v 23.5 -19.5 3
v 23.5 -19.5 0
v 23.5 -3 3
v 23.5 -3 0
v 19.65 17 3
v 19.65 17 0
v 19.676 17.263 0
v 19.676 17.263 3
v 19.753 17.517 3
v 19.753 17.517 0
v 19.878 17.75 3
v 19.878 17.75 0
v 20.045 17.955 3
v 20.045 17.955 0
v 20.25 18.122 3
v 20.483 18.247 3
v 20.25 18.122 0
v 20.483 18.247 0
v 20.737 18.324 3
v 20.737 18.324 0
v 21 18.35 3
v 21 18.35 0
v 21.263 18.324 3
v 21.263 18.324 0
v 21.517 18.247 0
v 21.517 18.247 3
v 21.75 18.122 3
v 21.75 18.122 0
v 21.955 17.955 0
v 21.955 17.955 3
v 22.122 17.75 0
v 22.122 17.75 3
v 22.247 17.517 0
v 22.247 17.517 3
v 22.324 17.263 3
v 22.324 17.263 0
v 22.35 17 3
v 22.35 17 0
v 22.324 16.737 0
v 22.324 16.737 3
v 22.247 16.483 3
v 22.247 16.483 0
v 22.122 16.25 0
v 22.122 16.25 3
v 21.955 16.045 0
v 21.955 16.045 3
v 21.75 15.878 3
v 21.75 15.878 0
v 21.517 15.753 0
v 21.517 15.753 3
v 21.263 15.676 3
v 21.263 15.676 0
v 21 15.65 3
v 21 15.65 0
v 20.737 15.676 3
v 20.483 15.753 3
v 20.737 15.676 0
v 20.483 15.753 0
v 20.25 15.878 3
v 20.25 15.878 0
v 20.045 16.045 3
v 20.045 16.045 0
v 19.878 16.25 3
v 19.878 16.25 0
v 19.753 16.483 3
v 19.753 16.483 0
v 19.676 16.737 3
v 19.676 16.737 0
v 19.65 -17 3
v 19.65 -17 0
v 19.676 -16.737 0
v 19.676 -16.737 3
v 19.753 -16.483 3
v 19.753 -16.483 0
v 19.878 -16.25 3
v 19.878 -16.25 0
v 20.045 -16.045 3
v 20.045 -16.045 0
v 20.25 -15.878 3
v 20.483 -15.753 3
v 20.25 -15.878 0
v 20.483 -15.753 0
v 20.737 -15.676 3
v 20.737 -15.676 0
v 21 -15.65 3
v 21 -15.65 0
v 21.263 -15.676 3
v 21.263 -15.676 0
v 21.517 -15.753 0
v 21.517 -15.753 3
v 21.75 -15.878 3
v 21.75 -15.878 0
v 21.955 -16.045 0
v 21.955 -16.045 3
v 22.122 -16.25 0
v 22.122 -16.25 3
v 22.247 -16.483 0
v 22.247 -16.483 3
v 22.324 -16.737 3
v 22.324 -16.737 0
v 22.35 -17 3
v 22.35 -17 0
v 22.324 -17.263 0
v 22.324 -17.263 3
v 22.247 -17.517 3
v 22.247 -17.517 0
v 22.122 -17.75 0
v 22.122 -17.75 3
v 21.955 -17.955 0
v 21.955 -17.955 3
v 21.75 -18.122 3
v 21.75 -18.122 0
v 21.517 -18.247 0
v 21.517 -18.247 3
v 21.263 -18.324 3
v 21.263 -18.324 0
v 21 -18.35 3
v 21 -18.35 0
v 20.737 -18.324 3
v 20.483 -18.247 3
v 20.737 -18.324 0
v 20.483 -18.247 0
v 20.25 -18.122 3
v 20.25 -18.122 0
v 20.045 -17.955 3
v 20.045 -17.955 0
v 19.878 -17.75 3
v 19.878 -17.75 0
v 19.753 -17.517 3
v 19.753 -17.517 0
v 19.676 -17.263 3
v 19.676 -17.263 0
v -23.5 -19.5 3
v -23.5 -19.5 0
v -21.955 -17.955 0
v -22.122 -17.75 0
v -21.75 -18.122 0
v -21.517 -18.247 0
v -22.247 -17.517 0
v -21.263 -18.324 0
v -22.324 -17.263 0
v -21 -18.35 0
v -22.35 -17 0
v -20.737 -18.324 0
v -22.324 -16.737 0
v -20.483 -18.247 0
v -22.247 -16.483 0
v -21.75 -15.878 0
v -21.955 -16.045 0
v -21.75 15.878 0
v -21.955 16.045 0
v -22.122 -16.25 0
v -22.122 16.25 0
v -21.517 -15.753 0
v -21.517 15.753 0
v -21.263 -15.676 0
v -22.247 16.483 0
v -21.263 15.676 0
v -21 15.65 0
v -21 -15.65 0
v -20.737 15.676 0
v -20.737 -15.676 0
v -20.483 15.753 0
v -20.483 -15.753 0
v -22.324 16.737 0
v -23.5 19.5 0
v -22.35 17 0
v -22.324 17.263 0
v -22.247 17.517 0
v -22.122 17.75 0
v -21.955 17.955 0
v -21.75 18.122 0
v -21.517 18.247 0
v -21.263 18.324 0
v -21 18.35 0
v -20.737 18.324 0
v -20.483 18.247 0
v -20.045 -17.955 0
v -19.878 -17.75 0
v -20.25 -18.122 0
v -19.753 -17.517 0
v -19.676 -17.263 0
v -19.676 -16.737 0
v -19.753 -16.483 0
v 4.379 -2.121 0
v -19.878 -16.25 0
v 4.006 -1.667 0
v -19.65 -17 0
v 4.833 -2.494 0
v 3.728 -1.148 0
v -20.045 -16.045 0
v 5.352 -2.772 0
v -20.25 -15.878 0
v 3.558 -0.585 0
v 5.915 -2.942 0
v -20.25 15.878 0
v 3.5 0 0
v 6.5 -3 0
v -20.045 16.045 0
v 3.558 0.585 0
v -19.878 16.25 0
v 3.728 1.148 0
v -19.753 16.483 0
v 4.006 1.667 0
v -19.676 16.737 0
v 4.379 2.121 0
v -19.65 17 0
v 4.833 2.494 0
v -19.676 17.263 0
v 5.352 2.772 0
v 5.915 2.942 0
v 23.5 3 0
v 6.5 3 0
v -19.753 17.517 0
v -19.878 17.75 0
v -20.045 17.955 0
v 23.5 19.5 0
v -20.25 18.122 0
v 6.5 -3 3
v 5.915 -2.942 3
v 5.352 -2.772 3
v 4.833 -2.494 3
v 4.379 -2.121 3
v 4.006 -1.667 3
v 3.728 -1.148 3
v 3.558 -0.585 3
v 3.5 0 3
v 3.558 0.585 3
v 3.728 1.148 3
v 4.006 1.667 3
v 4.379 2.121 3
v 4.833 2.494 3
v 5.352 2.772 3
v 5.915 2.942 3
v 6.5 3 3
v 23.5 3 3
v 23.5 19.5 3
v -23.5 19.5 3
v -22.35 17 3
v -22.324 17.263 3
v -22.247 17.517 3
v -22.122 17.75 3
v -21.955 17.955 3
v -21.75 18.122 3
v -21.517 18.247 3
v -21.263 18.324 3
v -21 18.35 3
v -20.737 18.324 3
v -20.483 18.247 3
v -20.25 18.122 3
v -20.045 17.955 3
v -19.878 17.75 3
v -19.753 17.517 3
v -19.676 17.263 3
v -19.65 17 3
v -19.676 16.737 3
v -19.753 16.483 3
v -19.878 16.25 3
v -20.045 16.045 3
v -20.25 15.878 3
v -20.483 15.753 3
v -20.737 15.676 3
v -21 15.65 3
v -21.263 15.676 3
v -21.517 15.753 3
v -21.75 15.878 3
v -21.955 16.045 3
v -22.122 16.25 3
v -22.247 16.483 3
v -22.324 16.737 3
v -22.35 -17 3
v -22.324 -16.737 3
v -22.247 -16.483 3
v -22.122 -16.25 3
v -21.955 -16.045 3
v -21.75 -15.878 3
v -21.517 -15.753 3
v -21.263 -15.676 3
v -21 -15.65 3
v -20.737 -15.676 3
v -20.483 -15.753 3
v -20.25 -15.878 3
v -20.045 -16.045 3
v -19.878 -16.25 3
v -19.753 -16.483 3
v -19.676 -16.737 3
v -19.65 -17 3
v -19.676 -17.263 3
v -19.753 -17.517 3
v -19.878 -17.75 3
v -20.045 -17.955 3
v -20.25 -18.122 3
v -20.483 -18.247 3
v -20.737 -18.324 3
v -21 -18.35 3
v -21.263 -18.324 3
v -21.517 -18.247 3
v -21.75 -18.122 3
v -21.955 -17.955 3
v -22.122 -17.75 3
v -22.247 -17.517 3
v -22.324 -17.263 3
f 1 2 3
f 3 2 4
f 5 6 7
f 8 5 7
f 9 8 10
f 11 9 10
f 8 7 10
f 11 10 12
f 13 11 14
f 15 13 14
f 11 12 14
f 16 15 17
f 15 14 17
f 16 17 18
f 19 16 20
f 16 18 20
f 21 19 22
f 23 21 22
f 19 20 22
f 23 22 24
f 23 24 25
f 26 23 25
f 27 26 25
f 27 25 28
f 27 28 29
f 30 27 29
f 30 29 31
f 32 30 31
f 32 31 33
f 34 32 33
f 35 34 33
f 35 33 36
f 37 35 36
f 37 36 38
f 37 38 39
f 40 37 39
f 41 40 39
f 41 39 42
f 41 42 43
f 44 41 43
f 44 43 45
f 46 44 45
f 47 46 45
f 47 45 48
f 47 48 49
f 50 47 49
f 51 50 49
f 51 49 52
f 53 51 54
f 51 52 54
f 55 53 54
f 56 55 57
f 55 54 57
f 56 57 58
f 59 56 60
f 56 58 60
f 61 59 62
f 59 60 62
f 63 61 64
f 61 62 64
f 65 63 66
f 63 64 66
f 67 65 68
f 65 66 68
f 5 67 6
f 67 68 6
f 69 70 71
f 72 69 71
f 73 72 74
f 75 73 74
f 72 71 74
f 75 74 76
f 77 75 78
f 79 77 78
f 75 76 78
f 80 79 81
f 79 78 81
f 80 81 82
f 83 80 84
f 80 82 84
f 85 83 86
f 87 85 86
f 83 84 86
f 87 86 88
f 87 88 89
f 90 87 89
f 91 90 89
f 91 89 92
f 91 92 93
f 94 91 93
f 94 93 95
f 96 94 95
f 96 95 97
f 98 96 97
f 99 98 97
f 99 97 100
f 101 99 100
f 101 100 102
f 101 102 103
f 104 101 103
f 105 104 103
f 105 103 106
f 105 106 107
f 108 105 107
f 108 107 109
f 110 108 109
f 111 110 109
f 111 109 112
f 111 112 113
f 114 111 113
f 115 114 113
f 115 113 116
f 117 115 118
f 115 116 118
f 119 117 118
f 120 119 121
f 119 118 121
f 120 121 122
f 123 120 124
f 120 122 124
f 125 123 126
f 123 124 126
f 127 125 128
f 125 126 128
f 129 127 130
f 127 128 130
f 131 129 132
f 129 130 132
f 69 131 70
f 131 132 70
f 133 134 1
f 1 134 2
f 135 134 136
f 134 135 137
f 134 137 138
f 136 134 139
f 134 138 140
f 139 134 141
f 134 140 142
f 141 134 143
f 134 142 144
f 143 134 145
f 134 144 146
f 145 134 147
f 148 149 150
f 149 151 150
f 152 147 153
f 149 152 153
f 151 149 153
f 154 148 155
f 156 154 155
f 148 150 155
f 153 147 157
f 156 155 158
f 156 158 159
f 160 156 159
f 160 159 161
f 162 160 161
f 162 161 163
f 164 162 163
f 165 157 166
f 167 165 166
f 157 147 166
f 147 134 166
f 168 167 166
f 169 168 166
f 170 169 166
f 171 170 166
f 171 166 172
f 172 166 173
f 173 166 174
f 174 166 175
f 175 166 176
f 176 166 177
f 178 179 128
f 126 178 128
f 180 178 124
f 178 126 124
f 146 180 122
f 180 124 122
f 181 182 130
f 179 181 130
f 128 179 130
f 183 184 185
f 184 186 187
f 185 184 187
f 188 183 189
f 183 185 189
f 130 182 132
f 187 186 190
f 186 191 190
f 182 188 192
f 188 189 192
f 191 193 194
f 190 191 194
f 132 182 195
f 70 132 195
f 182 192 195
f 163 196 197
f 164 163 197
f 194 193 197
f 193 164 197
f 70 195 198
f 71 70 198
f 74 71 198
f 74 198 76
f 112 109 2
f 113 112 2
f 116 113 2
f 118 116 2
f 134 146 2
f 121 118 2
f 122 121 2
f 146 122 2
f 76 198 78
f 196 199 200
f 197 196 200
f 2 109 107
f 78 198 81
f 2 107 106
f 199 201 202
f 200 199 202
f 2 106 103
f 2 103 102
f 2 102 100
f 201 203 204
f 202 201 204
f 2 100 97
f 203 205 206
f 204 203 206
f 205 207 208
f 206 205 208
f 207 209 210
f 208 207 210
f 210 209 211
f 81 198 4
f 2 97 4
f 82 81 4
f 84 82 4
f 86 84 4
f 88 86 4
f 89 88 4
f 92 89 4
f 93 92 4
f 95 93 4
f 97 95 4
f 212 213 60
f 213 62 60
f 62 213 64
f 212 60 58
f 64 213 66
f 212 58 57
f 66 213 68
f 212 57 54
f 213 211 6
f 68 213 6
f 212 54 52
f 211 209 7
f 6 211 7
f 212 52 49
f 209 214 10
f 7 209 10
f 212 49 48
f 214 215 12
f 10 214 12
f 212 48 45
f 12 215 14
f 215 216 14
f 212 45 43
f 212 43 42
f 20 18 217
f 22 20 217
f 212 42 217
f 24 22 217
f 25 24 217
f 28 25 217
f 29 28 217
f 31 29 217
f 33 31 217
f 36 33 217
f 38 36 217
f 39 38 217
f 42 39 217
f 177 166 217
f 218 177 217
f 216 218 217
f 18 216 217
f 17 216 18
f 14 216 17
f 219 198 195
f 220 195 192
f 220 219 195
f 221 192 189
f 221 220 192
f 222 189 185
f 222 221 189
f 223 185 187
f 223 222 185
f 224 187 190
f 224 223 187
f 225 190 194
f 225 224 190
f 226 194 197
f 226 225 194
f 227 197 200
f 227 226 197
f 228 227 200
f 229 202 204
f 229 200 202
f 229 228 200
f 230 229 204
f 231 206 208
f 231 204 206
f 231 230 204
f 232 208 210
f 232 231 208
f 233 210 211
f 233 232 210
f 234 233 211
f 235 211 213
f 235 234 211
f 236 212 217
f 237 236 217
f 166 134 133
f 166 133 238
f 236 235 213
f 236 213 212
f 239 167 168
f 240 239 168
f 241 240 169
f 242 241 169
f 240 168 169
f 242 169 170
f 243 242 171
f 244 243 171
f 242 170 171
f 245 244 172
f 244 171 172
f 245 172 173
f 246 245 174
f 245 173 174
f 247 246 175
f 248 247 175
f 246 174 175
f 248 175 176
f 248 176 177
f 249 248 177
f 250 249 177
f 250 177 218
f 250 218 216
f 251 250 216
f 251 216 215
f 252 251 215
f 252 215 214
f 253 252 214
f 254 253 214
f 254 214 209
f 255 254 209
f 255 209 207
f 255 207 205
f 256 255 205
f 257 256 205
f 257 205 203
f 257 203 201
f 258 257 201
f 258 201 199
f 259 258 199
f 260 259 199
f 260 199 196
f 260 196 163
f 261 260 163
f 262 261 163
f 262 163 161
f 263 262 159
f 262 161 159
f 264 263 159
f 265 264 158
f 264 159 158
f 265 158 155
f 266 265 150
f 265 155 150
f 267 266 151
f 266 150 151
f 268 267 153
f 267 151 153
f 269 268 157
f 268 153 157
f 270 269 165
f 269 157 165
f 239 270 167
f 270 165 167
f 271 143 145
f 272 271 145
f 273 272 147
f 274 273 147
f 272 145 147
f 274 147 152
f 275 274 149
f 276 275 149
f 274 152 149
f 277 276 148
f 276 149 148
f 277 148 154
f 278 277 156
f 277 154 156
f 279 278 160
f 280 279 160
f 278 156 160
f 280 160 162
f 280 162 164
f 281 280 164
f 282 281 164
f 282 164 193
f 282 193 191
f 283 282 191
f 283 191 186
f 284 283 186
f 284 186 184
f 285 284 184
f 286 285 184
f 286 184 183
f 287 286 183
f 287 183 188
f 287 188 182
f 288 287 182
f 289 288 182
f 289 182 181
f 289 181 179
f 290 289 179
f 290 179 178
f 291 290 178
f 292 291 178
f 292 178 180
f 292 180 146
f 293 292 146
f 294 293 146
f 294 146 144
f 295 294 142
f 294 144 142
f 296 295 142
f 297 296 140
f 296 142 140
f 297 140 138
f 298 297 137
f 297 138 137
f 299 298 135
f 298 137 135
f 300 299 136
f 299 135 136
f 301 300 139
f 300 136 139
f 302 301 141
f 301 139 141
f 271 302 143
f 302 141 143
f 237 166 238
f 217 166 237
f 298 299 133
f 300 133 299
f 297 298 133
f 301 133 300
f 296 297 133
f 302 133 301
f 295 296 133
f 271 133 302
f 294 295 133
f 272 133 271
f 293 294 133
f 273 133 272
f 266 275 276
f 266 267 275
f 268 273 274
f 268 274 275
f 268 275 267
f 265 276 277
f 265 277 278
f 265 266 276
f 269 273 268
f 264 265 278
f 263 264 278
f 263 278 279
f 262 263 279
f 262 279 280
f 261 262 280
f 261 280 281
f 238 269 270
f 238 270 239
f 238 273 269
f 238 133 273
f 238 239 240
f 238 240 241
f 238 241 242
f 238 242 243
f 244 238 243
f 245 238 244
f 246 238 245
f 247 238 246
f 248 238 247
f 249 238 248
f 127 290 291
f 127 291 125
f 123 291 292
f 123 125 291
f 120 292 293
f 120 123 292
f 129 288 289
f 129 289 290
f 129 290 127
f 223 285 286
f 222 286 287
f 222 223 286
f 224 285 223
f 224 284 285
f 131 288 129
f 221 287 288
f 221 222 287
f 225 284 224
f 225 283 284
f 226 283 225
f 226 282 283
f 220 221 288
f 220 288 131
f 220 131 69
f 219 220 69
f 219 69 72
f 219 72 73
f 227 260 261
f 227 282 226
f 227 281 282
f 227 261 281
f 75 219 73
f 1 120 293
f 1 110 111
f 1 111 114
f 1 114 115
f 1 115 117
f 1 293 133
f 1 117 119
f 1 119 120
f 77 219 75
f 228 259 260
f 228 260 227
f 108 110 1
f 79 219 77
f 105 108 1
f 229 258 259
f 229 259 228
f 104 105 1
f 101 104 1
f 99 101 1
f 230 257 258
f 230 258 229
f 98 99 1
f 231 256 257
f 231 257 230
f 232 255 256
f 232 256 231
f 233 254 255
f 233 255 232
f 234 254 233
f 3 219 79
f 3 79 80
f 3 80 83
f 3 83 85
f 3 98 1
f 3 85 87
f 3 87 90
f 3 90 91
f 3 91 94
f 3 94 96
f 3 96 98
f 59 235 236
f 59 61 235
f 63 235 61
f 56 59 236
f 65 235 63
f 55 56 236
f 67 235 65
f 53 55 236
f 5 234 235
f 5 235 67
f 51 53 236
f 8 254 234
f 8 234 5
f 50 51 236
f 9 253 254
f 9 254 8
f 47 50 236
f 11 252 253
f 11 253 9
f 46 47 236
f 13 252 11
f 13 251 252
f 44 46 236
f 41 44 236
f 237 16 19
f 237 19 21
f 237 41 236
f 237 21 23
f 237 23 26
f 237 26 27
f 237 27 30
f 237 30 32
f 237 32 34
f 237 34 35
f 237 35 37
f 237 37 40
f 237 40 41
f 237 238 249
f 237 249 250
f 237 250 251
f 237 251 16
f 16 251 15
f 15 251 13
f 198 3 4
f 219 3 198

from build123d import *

# Parameters (mm, degrees)
SKETCH_1_W           = 47
SKETCH_1_H           = 39
EXTRUDE_1_DEPTH      = 3
HOLE_WIZARD_M2_5_1_D = 2.7
CUT_EXTRUDE_1_REACH  = 32.684


with BuildPart() as part:
    # 草图1 → 凸台-拉伸1 (new body)
    with BuildSketch(Plane.XY):
        Rectangle(SKETCH_1_W, SKETCH_1_H)
    extrude(amount=EXTRUDE_1_DEPTH)

    # M2.5 间隙孔1 (through all)
    with Locations(Plane.XY.offset(3)):
        with Locations((-21, -17), (21, 17), (21, -17), (-21, 17)):
            Hole(HOLE_WIZARD_M2_5_1_D / 2)

    # 草图5 → 切除-拉伸1 (cut, up to next)
    with BuildSketch(Plane.XY.offset(3), mode=Mode.PRIVATE) as cut_extrude_1_sk1:
        with BuildLine():
            Line((6.5, 3), (23.5, 3))
            ThreePointArc((23.5, 3), (26.5, 0), (23.5, -3))
            Line((23.5, -3), (6.5, -3))
            ThreePointArc((6.5, -3), (3.5, 0), (6.5, 3))
        make_face()
    cut_extrude_1_tool1 = extrude(cut_extrude_1_sk1.sketch, amount=-CUT_EXTRUDE_1_REACH, mode=Mode.PRIVATE) & part.part
    add(cut_extrude_1_tool1.solids().sort_by_distance((15, 0, 3))[0], mode=Mode.SUBTRACT)


solid = part.part
